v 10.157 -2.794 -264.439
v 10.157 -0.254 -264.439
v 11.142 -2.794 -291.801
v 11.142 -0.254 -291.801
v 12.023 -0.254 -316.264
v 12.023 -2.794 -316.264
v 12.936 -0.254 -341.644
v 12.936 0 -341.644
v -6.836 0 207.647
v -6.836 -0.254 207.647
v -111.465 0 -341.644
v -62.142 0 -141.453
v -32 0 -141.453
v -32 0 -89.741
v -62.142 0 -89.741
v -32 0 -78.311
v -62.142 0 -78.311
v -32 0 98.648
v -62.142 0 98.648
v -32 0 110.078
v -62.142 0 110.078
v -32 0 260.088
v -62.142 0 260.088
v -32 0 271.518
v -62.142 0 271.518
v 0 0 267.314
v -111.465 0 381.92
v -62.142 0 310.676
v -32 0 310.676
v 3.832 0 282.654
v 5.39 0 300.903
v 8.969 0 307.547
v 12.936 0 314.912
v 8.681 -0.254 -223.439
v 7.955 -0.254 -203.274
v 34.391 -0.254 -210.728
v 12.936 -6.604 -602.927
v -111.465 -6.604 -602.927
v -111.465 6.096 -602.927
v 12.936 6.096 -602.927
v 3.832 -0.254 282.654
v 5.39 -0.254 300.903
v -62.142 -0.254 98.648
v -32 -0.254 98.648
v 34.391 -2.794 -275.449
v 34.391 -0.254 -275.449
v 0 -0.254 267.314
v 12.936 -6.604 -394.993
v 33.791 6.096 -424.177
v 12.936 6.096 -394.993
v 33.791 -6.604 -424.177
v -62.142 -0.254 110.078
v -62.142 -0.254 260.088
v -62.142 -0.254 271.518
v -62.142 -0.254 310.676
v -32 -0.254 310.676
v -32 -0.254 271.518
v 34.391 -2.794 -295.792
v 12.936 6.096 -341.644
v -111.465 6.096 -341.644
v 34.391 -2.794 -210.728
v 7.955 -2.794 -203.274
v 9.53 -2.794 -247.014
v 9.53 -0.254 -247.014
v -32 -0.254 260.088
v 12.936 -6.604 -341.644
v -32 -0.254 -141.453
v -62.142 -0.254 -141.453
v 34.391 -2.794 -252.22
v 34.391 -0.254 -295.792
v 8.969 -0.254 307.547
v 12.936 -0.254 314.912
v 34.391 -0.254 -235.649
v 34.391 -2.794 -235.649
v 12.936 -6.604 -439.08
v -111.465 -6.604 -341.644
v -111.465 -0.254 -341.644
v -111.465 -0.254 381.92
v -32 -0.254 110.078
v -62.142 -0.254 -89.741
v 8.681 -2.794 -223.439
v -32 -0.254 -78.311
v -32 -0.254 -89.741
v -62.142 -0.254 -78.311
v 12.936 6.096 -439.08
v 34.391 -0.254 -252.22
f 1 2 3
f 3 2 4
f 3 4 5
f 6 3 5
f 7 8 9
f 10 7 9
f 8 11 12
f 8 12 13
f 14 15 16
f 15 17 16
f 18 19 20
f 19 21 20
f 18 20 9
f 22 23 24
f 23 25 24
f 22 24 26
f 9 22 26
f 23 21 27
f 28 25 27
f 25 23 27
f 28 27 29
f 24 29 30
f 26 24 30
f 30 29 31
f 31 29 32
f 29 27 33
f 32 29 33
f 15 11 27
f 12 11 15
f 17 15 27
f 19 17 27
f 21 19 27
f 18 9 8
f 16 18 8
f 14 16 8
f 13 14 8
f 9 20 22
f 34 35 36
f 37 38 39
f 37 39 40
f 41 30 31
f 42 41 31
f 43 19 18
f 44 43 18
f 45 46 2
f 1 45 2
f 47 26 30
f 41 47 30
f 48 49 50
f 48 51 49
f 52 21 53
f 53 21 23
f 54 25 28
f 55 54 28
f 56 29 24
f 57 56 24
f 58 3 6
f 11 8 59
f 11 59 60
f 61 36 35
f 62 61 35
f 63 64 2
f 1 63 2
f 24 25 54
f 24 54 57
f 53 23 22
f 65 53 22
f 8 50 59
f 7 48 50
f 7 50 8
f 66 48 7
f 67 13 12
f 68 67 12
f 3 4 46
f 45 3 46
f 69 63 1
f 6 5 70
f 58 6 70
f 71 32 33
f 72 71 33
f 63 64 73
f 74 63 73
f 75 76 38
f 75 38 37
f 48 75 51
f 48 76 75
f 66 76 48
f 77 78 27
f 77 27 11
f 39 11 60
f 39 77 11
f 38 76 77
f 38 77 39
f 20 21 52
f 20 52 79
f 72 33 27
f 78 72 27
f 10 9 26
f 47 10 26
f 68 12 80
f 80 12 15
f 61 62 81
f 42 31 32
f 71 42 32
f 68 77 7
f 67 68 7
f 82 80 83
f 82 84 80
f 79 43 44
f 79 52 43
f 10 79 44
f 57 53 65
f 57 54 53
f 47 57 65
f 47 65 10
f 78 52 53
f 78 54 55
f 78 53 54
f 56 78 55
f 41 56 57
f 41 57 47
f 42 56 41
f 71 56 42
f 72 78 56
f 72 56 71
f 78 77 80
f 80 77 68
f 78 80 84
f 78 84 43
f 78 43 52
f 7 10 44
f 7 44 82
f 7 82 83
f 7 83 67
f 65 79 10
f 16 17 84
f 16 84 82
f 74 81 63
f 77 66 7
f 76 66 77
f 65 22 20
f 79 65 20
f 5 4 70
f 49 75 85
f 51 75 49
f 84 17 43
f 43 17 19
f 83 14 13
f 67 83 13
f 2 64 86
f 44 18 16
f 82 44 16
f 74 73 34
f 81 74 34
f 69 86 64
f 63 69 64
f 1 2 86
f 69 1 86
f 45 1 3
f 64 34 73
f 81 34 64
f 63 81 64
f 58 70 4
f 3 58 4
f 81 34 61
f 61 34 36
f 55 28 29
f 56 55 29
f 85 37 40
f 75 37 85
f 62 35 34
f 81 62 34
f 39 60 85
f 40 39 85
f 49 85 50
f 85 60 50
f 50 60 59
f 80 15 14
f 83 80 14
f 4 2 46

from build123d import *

# Parameters (mm, degrees)
F0_W     = 30.1419294609
F0_H     = 11.43
F1_DEPTH = 0.254
F3_DEPTH = 6.35
F5_DEPTH = 2.54


with BuildPart() as f1:
    # F0 (on Front) → F1 (new body)
    with BuildSketch(Plane.XZ):
        Polygon((12.9361804648, 314.9115679839), (-111.4649921729, 381.9201163345), (-111.4649921729, -341.6439707719), (12.9361804648, -341.6439707719), (-6.8362173624, 207.6474577188), (0, 267.3144340515), (3.8324750494, 282.65401721), (5.3904698068, 300.9029783735), (8.9691670423, 307.5468192501), align=None)
        Polygon((-62.1419251557, 271.5176398946), (-62.1419251557, 310.6756428487), (-31.9999956948, 310.6756428487), (-31.9999956948, 271.5176398946), (-31.9999956948, 260.0876398946), (-31.9999956948, 110.0776017578), (-31.9999956948, 98.6476017578), (-31.9999956948, -78.3114169879), (-31.9999956948, -89.7414169879), (-31.9999956948, -141.4527670427), (-62.1419251557, -141.4527670427), (-62.1419251557, -89.7414169879), (-62.1419251557, -78.3114169879), (-62.1419251557, 98.6476017578), (-62.1419251557, 110.0776017578), (-62.1419251557, 260.0876398946), align=None, mode=Mode.SUBTRACT)
        with Locations((-47.0709604253, 104.3626017578)):
            Rectangle(F0_W, F0_H)
        with Locations((-47.0709604253, 265.8026398946)):
            Rectangle(F0_W, F0_H)
        with Locations((-47.0709604253, -84.0264169879)):
            Rectangle(F0_W, F0_H)
    extrude(amount=F1_DEPTH)

    # F2 (on face) → F3 (join, symmetric)
    with BuildSketch(Plane.XZ.offset(0.254)):
        Polygon((12.9361804648, -341.6439707719), (-111.4649921729, -341.6439707719), (-111.4649921729, -602.9273867607), (12.9361804648, -602.9273867607), (12.9361804648, -439.079940543), (33.7909050286, -424.1771399975), (12.9361804648, -394.9933946133), align=None)
    extrude(amount=F3_DEPTH, both=True)


with BuildPart() as f5:
    # F4 (on face) → F5 (new body)
    with BuildSketch(Plane.XZ.offset(0.254)):
        Polygon((34.3912541866, -210.7275873423), (7.955387585, -203.2739632566), (8.6812435361, -223.4387634865), align=None)
    extrude(amount=F5_DEPTH)


with BuildPart() as f5b:
    # F4 (on face) → F5, piece 2 (new body)
    with BuildSketch(Plane.XZ.offset(0.254)):
        Polygon((34.3912541866, -235.6494069099), (8.6812435361, -223.4387634865), (9.5298459137, -247.0135477039), align=None)
    extrude(amount=F5_DEPTH)


with BuildPart() as f5c:
    # F4 (on face) → F5, piece 3 (new body)
    with BuildSketch(Plane.XZ.offset(0.254)):
        Polygon((34.3912541866, -252.2200345993), (9.5298459137, -247.0135477039), (10.1570874643, -264.4387689827), align=None)
    extrude(amount=F5_DEPTH)


with BuildPart() as f5d:
    # F4 (on face) → F5, piece 4 (new body)
    with BuildSketch(Plane.XZ.offset(0.254)):
        Polygon((34.3912541866, -275.4489779472), (10.1570874643, -264.4387689827), (11.1420411519, -291.8014906281), align=None)
    extrude(amount=F5_DEPTH)


with BuildPart() as f5e:
    # F4 (on face) → F5, piece 5 (new body)
    with BuildSketch(Plane.XZ.offset(0.254)):
        Polygon((34.3912541866, -295.7924902439), (11.1420411519, -291.8014906281), (12.0226099788, -316.2643257906), align=None)
    extrude(amount=F5_DEPTH)


solid = Compound([f1.part, f5.part, f5b.part, f5c.part, f5d.part, f5e.part])
